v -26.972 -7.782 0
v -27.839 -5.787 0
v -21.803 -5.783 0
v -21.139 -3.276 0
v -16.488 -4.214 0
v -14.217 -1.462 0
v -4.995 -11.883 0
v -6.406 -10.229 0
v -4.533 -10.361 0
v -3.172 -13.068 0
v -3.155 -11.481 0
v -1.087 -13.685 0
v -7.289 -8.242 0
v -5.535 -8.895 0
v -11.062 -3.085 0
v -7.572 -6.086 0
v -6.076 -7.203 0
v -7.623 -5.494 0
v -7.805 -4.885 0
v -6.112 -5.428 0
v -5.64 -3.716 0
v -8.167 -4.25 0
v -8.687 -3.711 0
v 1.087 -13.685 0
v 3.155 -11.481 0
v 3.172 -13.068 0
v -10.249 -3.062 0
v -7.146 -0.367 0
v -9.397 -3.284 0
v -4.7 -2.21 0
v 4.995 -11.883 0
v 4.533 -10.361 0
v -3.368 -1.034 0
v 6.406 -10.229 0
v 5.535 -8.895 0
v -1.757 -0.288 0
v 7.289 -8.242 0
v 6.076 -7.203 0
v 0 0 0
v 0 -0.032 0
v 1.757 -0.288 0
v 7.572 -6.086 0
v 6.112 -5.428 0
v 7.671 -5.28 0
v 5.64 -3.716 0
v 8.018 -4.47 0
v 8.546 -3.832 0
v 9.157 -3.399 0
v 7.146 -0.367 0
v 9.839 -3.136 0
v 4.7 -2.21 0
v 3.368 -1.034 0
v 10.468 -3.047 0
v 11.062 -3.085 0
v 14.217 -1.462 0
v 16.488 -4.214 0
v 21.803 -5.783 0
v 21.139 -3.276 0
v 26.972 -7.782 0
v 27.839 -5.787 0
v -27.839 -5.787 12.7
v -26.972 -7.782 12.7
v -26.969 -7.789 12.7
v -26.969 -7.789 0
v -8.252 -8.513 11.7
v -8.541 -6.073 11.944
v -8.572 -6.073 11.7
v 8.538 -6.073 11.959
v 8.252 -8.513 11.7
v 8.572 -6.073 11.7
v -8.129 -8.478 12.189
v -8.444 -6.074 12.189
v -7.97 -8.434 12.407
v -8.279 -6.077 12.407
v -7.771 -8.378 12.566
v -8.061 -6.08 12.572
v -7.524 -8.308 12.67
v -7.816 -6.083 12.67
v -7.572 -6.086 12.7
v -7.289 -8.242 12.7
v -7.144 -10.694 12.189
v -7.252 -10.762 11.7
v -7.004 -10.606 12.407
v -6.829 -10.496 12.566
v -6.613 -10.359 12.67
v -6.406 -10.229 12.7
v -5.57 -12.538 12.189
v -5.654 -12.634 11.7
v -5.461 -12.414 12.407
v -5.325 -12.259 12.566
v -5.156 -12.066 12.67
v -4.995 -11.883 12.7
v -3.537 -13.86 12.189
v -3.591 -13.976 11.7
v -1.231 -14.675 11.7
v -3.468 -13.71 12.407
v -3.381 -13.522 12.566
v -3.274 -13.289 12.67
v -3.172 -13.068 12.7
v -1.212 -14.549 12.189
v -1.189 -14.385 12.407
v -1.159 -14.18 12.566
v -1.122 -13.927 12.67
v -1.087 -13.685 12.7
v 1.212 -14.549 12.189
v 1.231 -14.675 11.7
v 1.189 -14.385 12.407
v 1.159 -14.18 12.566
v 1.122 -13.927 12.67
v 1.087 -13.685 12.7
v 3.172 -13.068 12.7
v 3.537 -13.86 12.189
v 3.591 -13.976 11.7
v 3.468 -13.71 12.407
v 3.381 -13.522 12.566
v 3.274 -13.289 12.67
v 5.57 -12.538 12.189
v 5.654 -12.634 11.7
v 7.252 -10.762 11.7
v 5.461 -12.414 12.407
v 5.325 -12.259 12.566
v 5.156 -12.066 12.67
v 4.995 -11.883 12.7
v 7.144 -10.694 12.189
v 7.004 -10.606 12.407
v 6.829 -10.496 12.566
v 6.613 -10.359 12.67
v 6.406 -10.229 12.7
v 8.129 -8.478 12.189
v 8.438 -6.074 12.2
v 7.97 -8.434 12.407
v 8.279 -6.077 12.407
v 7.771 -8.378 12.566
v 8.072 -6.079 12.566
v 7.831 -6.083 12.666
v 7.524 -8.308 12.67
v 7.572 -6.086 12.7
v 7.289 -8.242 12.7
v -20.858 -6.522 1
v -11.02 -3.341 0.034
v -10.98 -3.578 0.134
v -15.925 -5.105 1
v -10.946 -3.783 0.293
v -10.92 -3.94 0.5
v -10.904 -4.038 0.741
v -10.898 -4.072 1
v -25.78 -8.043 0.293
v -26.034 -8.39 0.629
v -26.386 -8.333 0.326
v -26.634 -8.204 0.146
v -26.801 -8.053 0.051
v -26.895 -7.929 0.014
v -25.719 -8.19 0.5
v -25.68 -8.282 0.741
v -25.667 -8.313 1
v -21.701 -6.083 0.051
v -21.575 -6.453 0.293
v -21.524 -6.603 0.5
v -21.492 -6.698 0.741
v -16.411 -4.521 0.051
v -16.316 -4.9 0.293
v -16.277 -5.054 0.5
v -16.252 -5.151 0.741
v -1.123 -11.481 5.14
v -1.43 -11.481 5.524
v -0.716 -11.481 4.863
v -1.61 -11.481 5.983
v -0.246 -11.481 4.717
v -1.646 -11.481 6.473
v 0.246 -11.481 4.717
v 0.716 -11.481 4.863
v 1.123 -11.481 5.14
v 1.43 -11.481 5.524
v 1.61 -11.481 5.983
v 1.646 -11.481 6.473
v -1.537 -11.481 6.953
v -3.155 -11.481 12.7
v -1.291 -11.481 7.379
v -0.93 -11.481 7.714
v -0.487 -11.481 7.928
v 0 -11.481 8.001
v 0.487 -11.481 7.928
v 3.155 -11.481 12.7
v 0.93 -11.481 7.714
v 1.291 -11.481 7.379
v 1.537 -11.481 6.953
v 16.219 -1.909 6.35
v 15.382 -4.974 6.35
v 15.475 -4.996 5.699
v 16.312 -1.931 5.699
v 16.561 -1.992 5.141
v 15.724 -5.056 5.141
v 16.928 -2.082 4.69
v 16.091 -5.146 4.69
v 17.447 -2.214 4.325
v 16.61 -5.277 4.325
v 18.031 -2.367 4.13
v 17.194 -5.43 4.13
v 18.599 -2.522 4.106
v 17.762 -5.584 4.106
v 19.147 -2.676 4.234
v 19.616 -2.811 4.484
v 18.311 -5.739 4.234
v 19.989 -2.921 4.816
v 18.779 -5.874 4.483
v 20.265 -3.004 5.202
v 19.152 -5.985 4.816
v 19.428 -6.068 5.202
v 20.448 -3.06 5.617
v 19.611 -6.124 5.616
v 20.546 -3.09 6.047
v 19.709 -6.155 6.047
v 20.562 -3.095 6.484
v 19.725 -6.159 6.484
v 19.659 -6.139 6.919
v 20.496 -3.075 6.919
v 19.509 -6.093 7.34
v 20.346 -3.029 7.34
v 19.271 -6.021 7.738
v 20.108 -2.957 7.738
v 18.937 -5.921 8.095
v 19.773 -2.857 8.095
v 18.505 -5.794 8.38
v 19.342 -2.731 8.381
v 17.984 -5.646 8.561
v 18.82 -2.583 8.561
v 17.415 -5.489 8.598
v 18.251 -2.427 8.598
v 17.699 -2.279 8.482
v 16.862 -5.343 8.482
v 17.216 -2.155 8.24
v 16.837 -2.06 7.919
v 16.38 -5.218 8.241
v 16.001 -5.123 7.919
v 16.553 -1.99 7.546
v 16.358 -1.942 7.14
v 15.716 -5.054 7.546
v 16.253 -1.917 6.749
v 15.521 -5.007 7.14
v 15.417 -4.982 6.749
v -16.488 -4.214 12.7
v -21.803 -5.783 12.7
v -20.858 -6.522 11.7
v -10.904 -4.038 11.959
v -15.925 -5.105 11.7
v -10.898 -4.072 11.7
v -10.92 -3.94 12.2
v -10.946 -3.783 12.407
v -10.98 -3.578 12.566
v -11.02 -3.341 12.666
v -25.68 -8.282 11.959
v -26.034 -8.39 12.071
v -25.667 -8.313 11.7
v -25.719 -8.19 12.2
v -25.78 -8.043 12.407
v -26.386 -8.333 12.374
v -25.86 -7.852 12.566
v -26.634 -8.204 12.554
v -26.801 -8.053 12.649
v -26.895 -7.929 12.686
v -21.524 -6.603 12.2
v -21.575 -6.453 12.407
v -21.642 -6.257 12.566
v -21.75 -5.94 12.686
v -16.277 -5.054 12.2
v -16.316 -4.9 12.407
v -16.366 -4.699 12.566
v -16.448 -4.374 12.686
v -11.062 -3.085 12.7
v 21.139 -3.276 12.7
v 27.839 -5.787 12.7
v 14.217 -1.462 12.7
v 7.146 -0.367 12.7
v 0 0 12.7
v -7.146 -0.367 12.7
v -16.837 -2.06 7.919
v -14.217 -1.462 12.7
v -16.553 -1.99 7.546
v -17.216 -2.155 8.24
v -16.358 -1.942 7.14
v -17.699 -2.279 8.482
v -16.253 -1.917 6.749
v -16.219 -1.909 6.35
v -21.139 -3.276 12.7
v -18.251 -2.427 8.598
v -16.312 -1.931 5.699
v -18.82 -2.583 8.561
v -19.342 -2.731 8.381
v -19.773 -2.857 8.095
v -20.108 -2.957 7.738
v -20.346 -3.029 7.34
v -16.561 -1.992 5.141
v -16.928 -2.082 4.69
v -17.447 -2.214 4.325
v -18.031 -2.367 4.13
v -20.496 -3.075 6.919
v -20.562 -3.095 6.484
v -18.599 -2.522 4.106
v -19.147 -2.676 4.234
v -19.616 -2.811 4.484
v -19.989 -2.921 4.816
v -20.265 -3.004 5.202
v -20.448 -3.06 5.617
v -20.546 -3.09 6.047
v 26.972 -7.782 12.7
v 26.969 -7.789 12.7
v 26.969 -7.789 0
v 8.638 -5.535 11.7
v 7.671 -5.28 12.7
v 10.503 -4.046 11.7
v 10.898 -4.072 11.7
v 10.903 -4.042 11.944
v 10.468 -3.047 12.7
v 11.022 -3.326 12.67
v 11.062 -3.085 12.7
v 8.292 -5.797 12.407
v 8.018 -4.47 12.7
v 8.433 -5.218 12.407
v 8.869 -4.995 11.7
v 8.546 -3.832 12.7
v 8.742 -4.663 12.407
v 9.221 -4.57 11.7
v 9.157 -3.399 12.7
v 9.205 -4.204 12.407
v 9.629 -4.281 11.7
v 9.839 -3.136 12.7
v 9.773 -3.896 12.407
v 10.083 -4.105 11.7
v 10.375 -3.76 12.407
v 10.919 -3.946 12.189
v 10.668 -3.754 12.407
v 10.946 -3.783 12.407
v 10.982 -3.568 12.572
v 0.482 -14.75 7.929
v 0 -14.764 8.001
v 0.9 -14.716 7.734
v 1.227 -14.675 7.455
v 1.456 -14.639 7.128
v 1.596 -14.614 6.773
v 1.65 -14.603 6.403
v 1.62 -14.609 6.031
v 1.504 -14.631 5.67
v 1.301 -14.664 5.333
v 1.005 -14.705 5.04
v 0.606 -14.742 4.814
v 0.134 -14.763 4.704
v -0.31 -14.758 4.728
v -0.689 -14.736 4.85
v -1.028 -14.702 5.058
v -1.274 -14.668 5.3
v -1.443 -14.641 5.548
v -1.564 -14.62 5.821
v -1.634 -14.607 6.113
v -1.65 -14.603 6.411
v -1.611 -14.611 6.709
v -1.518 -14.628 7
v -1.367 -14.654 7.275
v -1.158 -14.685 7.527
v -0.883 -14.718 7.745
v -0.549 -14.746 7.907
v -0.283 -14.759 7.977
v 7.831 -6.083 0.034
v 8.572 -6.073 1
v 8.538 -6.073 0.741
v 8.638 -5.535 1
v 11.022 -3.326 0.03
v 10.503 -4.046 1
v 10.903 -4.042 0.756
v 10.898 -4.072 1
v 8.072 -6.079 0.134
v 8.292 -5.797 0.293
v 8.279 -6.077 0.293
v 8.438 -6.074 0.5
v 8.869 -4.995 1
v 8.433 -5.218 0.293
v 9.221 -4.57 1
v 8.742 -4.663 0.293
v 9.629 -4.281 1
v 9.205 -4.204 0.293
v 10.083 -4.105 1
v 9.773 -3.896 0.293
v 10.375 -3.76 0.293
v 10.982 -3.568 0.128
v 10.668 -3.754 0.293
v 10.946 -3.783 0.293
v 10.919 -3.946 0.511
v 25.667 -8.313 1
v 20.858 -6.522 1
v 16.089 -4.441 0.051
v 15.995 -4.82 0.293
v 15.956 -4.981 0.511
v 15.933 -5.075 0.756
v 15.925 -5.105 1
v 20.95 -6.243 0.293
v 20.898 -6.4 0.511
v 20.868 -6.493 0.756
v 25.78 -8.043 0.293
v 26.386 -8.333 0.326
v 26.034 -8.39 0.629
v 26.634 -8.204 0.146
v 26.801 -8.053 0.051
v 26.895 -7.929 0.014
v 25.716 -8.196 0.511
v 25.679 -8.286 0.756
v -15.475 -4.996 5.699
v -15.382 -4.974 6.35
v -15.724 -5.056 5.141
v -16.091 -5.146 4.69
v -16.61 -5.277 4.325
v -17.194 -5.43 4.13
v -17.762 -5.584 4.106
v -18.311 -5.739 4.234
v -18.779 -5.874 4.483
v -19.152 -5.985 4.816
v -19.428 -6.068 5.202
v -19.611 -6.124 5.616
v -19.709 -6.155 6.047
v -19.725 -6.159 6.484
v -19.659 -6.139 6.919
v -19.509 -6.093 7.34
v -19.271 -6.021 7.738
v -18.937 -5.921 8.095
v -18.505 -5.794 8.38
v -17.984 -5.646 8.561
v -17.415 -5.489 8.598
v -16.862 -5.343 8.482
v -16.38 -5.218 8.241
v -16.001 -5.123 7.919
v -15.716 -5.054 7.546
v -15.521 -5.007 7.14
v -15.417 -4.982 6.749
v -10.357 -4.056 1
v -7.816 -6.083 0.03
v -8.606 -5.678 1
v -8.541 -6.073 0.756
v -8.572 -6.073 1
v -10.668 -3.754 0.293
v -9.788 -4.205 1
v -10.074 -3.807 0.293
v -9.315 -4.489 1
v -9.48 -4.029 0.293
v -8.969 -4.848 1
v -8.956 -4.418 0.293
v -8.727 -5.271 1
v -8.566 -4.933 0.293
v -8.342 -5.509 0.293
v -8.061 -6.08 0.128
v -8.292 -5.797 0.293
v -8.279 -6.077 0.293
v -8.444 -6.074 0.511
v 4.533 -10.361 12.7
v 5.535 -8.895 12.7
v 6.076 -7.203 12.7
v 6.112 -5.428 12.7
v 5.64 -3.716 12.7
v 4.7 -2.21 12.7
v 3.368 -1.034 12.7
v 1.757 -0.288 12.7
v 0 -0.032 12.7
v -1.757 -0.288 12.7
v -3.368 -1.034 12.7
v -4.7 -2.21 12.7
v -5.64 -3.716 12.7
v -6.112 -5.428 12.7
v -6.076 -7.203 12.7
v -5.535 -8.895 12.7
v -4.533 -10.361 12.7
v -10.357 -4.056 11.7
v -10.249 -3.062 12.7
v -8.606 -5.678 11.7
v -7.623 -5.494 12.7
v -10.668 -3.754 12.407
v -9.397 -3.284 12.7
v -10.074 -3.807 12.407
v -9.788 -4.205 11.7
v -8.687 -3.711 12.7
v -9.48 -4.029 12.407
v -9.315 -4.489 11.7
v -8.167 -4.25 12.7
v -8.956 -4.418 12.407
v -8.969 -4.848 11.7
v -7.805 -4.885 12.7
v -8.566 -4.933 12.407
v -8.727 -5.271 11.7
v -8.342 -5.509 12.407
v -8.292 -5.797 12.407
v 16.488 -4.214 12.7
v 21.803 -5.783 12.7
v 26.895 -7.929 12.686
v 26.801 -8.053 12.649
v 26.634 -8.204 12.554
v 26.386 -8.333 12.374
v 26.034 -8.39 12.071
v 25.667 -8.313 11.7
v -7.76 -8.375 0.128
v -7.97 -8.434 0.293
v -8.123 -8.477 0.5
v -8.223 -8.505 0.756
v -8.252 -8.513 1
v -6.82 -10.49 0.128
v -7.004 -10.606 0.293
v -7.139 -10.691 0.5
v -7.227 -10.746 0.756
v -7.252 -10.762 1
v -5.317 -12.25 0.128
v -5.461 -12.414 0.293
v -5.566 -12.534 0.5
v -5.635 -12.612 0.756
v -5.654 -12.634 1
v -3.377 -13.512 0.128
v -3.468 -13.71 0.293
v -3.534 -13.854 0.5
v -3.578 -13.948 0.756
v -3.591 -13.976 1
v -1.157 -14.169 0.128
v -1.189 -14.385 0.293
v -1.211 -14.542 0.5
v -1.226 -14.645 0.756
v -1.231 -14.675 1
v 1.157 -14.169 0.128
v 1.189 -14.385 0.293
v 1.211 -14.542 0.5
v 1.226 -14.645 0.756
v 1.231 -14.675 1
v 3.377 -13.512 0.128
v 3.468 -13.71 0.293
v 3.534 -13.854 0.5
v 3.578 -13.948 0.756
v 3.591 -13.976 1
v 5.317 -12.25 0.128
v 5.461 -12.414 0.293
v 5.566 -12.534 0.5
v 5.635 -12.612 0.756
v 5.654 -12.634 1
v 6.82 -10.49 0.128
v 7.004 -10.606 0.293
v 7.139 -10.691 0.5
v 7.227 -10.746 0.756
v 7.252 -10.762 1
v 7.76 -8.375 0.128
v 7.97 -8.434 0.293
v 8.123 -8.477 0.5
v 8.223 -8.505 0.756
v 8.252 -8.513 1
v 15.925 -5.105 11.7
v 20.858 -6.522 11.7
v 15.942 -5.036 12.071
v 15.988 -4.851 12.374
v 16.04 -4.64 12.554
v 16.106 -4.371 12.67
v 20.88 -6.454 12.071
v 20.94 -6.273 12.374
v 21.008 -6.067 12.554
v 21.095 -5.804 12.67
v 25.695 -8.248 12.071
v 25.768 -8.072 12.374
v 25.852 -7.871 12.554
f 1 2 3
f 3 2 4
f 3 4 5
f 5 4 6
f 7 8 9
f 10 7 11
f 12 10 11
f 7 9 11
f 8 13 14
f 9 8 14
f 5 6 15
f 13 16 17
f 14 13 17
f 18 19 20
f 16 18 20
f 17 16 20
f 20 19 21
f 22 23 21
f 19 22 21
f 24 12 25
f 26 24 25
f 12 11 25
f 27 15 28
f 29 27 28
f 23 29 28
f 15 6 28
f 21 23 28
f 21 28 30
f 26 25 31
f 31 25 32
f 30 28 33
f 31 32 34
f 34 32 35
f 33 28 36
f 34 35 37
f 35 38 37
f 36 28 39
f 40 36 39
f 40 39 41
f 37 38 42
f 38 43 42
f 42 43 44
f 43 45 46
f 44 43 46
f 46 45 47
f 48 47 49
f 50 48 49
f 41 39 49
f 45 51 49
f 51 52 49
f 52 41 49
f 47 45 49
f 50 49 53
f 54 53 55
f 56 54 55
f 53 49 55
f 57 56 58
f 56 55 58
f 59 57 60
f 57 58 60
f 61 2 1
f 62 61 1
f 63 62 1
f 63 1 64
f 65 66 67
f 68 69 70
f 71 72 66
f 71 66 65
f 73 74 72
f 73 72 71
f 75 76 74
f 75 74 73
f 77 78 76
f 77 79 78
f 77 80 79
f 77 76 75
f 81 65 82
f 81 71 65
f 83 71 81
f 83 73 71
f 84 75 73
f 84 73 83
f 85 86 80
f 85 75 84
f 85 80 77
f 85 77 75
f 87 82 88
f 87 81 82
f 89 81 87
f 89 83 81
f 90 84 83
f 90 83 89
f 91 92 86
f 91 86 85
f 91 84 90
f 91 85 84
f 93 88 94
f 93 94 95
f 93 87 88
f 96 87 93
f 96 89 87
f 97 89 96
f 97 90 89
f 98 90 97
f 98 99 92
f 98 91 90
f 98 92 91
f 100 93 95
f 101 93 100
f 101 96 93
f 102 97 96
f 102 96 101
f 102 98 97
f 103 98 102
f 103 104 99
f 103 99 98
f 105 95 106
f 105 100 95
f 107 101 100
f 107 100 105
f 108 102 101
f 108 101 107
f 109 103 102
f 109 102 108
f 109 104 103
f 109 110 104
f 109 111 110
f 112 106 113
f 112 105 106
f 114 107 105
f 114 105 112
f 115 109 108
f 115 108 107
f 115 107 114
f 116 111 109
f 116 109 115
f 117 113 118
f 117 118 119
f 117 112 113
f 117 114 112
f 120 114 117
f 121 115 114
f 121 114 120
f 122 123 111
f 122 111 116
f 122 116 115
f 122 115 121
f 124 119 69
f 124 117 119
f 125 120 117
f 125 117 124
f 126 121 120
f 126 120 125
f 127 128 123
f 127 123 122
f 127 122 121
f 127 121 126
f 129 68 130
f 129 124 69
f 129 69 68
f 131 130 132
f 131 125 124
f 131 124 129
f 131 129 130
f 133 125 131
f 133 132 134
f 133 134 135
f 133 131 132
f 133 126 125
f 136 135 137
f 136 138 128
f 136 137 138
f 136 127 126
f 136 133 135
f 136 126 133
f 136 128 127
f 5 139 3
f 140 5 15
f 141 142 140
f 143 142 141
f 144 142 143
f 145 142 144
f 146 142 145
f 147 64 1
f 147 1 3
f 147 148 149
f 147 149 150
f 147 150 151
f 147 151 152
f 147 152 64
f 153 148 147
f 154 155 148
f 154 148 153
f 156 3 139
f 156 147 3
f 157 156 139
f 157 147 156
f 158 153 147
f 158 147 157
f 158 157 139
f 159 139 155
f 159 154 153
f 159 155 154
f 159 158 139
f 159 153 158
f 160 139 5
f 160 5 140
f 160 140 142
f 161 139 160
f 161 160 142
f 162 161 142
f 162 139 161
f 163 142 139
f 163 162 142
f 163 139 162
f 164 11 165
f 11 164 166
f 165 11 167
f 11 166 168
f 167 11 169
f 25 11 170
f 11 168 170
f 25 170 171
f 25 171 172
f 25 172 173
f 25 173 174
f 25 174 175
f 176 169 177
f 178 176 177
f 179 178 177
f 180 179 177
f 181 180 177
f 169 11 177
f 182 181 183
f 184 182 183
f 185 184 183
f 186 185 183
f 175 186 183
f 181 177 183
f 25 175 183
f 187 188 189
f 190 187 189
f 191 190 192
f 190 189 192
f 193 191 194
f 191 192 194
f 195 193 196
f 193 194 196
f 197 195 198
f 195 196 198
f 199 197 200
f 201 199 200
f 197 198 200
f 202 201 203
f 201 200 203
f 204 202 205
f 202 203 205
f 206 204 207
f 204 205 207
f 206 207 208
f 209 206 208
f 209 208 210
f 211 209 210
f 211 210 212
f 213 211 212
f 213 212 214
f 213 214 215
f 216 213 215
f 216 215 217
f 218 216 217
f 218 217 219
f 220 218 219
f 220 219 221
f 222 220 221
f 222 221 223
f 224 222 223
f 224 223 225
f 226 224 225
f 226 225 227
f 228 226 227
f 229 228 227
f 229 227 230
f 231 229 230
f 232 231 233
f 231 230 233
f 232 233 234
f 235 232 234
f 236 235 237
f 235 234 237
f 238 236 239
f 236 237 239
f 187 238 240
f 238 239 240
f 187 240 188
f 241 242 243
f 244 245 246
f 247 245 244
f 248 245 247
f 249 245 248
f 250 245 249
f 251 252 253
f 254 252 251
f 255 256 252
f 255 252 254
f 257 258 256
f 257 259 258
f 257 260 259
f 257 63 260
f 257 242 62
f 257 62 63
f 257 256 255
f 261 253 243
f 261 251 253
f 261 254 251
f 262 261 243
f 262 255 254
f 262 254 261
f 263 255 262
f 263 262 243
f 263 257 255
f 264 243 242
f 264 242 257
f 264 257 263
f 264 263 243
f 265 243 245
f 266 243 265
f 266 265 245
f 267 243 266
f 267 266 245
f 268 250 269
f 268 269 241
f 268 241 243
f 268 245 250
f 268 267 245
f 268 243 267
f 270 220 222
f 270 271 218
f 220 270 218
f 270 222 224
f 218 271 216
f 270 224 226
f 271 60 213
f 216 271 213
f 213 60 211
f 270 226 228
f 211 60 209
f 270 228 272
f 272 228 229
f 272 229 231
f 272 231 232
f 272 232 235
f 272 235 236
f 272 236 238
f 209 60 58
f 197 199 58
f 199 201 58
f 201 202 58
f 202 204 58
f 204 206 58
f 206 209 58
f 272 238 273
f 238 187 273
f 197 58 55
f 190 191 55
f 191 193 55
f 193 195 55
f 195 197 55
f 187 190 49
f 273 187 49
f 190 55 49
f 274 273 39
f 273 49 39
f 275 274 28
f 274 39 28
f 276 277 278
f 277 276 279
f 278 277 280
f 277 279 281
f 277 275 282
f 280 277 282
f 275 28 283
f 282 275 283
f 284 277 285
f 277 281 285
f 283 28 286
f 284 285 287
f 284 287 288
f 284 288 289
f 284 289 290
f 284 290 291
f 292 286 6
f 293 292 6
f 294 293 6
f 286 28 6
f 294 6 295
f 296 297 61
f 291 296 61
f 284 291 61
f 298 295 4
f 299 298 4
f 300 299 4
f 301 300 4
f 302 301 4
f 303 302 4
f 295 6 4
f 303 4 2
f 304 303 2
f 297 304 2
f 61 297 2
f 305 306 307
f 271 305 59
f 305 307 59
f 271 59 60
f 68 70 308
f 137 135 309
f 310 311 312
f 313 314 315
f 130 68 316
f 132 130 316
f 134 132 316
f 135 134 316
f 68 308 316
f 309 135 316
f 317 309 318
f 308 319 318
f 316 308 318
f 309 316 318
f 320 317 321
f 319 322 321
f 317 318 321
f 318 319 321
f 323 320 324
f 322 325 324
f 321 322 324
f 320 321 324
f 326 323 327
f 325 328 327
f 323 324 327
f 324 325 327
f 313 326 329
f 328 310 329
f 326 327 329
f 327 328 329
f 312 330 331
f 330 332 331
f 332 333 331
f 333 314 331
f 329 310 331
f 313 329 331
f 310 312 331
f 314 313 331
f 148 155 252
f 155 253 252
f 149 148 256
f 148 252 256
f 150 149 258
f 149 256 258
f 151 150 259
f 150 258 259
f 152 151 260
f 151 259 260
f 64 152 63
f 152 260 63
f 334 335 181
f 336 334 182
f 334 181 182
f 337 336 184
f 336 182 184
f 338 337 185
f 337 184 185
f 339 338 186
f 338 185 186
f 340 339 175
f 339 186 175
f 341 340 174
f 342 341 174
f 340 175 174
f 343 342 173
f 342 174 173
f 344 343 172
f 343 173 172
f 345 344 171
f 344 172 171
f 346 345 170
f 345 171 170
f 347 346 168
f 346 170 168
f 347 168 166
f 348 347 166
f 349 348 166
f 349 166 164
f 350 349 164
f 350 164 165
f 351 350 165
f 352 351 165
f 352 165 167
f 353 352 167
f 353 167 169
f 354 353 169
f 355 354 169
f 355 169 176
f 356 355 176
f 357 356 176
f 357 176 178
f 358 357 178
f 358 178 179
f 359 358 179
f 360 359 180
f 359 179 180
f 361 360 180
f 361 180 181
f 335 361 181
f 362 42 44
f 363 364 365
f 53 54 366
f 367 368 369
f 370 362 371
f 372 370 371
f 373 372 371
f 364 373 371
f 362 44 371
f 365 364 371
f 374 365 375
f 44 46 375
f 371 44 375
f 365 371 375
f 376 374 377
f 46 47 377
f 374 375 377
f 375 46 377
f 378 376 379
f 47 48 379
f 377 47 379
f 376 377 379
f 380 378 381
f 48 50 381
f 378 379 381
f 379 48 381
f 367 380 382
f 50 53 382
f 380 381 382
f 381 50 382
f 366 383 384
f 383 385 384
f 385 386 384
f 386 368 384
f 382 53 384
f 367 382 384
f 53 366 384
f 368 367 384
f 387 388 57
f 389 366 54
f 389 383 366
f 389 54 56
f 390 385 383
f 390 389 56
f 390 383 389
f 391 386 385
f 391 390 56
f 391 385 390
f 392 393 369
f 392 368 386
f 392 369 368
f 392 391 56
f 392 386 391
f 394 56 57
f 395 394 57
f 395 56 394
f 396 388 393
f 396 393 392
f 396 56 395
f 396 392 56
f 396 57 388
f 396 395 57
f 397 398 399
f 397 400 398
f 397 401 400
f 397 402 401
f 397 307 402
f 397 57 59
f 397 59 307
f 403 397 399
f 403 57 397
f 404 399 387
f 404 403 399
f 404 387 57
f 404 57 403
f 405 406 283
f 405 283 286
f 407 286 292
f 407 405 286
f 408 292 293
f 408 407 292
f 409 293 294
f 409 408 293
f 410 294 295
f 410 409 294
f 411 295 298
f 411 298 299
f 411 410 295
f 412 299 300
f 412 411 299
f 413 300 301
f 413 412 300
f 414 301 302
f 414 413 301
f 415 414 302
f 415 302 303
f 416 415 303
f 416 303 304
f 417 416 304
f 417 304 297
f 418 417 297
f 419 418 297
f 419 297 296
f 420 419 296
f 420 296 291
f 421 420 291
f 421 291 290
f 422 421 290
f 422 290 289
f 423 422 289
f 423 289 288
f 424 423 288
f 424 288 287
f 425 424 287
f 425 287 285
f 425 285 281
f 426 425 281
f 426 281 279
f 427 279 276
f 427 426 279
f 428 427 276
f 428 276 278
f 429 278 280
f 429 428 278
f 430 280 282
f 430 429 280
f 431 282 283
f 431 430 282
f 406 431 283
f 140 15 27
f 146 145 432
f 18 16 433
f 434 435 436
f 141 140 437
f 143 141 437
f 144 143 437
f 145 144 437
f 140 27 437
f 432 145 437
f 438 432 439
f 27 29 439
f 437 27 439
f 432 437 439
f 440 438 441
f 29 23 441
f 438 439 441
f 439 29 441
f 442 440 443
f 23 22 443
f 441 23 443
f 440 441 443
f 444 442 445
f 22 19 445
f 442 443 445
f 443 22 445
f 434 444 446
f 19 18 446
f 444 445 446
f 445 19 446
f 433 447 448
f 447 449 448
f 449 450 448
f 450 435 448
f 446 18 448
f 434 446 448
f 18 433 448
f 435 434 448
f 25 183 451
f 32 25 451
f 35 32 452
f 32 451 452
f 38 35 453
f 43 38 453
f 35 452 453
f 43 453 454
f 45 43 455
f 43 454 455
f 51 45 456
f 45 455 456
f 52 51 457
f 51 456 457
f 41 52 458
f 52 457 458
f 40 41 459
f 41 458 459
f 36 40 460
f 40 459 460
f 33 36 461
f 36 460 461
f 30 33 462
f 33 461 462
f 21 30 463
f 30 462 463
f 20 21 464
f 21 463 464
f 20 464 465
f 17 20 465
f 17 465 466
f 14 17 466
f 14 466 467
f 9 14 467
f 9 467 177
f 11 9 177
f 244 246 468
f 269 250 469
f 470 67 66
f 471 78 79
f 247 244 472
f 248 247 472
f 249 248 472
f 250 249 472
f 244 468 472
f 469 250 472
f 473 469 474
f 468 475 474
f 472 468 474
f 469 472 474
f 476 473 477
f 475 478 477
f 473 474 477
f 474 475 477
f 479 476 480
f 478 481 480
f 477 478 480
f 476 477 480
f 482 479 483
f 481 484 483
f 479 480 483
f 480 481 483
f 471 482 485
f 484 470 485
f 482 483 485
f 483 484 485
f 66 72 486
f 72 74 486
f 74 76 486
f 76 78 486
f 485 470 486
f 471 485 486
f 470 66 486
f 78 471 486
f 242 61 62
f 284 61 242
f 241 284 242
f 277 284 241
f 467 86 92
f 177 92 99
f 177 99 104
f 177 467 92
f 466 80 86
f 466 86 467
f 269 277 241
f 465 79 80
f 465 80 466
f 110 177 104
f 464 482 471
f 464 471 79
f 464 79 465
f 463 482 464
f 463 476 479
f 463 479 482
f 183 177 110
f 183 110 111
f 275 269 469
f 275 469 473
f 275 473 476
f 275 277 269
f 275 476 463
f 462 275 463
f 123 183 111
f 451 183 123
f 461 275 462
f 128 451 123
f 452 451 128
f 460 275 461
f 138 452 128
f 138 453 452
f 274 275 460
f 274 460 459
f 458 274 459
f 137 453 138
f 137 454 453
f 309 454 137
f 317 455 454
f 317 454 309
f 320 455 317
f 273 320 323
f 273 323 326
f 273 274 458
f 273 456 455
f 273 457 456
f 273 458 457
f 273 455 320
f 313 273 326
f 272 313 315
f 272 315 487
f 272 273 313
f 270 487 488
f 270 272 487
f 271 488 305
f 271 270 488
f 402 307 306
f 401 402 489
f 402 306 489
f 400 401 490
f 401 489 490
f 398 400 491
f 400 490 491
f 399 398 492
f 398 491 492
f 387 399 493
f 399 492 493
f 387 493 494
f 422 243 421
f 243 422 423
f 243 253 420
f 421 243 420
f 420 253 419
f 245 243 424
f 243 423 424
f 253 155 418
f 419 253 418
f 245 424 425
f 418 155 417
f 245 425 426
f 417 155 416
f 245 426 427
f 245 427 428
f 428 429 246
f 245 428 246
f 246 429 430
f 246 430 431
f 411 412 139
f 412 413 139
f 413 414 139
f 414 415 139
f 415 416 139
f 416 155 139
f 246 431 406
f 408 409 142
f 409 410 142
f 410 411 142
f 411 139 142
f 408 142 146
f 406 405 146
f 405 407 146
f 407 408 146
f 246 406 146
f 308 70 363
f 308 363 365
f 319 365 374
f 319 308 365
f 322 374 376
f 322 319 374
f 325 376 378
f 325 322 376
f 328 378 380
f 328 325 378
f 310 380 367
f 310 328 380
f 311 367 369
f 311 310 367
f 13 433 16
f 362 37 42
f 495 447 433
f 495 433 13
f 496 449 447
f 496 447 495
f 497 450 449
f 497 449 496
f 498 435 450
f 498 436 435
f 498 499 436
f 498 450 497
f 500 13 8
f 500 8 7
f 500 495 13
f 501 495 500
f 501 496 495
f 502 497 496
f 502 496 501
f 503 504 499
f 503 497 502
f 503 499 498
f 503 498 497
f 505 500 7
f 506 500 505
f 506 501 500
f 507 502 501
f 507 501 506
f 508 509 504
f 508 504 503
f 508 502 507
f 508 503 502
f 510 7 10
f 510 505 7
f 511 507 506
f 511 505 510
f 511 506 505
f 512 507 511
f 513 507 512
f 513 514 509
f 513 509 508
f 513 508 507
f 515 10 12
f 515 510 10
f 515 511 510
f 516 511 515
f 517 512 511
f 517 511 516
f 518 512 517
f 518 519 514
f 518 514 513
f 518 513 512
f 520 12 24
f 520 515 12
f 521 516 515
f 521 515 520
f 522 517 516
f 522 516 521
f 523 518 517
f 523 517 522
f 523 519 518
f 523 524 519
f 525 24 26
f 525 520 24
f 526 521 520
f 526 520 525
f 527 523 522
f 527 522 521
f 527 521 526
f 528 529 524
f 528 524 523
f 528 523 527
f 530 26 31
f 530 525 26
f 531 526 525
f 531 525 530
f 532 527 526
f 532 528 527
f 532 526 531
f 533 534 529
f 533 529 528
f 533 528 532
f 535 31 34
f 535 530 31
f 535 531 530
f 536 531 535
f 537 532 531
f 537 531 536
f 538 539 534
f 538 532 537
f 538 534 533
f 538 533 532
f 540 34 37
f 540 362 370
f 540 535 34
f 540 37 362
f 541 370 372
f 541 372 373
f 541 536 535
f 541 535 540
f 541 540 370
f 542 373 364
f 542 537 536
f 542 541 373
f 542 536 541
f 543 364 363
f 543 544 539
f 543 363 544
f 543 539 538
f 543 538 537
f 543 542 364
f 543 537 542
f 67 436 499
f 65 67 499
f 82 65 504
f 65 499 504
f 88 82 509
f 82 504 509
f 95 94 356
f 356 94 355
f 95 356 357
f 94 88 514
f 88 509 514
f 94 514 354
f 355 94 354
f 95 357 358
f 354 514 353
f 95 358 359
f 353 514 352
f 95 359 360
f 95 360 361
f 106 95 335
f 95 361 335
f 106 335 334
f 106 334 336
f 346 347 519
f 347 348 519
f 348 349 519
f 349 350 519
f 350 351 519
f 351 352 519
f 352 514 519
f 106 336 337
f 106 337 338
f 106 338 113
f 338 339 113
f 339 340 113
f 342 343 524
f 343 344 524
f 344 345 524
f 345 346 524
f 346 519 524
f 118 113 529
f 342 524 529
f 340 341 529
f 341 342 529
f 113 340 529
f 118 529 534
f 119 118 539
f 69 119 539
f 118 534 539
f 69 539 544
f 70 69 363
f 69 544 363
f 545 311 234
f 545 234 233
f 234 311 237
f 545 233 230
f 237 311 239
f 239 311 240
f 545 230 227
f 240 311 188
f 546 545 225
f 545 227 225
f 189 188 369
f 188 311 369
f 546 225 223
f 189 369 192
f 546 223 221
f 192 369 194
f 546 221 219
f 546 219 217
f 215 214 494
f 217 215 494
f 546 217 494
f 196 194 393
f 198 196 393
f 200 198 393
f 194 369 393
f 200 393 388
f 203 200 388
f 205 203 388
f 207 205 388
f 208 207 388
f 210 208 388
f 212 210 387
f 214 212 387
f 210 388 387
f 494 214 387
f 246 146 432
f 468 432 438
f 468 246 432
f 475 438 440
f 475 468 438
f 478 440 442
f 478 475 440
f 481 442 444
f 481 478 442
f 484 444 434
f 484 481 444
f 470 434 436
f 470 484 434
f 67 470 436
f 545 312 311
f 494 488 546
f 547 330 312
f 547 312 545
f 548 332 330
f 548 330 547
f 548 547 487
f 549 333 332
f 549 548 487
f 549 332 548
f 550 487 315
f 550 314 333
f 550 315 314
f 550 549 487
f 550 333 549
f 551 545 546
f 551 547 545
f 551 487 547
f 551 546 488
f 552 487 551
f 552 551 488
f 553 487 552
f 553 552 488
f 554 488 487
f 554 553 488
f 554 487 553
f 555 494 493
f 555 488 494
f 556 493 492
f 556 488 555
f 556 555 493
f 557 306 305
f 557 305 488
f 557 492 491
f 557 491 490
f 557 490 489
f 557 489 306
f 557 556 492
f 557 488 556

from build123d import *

# Parameters (mm, degrees)
BOSS_EXTRUDE1_DEPTH = 12.7
SKETCH2_R           = 1.651
CUT_EXTRUDE1_DEPTH  = 33.458037303
SKETCH4_R           = 2.25298
CUT_EXTRUDE3_DEPTH  = 34.719236888
FILLET1_R           = 2
FILLET2_R           = 1
CUT_EXTRUDE4_DEPTH  = 34.974608094


with BuildPart() as part:
    # Sketch1 → Boss-Extrude1 (new body)
    with BuildSketch(Plane.XY):
        with BuildLine():
            Line((-27.839103255, -5.787477181), (-26.57368947, -8.699410036))
            ThreePointArc((-26.57368947, -8.699410036), (-17.565333038, -5.530370801), (-8.196652556, -3.680743454))
            ThreePointArc((-8.196652556, -3.680743454), (0, -14.76375), (8.196652556, -3.680743454))
            ThreePointArc((8.196652556, -3.680743454), (17.565333038, -5.530370801), (26.57368947, -8.699410036))
            Line((26.57368947, -8.699410036), (27.839103255, -5.787477181))
            ThreePointArc((27.839103255, -5.787477181), (0, 0), (-27.839103255, -5.787477181))
        make_face()
        with BuildLine():
            Line((-2.764985714, -10.82675), (2.764985714, -10.82675))
            ThreePointArc((2.764985714, -10.82675), (0, -0.79375), (-2.764985714, -10.82675))
        make_face(mode=Mode.SUBTRACT)
    extrude(amount=BOSS_EXTRUDE1_DEPTH)

    # Sketch2 → Cut-Extrude1 (cut, through all)
    with BuildSketch(Plane(origin=(0, -10.82675, 0), x_dir=(1, 0, 0), z_dir=(0, 1, 0))):
        with Locations(Location((0, -6.35, 0), (0, 0, 270))):
            Circle(SKETCH2_R)
    extrude(amount=-CUT_EXTRUDE1_DEPTH, mode=Mode.SUBTRACT)

    # Sketch4 → Cut-Extrude3 (cut, through all)
    with BuildSketch(Plane(origin=(0.366542573, -1.342182486, 0), x_dir=(0.9646738537497861, 0.2634470646857473, 0), z_dir=(-0.2634470646857473, 0.9646738537497861, 0))):
        with Locations((-18.401777468, -6.35)):
            Circle(SKETCH4_R)
    cut_extrude3 = extrude(amount=CUT_EXTRUDE3_DEPTH, mode=Mode.SUBTRACT)

    # Mirror1: Cut-Extrude3 across plane
    add(cut_extrude3.mirror(Plane(origin=(0, 0, 0), x_dir=(0, 0, 1), z_dir=(1, 0, 0))), mode=Mode.SUBTRACT)

    # Fillet1
    fillet1_edges = [part.edges().sort_by_distance(p)[0] for p in [
        (8.196652556, -3.680743454, 6.35),
        (-8.196652556, -3.680743454, 6.35),
    ]]
    fillet(fillet1_edges, radius=FILLET1_R)

    # Fillet2
    fillet2_edges = [part.edges().sort_by_distance(p)[0] for p in [
        (26.57368947, -8.699410036, 6.35),
        (-26.57368947, -8.699410036, 6.35),
        (-18.878378383, -5.903440635, 12.7),
        (0, -14.76375, 0),
        (0, -14.76375, 12.7),
        (18.878378383, -5.903440635, 0),
        (18.878378383, -5.903440635, 12.7),
        (-9.267474809, -4.528405008, 0),
        (-9.267474809, -4.528405008, 12.7),
        (9.267474809, -4.528405008, 0),
        (9.267474809, -4.528405008, 12.7),
        (-18.878378383, -5.903440635, 0),
    ]]
    fillet(fillet2_edges, radius=FILLET2_R)

    # Sketch5 → Cut-Extrude4 (cut, through all)
    with BuildSketch(Plane.XY.offset(12.7)):
        with BuildLine():
            Line((-3.155336639, -11.481173529), (3.155336639, -11.481173529))
            ThreePointArc((3.155336639, -11.481173529), (0, -0.03175), (-3.155336639, -11.481173529))
        make_face()
    extrude(amount=-CUT_EXTRUDE4_DEPTH, mode=Mode.SUBTRACT)


solid = part.part
